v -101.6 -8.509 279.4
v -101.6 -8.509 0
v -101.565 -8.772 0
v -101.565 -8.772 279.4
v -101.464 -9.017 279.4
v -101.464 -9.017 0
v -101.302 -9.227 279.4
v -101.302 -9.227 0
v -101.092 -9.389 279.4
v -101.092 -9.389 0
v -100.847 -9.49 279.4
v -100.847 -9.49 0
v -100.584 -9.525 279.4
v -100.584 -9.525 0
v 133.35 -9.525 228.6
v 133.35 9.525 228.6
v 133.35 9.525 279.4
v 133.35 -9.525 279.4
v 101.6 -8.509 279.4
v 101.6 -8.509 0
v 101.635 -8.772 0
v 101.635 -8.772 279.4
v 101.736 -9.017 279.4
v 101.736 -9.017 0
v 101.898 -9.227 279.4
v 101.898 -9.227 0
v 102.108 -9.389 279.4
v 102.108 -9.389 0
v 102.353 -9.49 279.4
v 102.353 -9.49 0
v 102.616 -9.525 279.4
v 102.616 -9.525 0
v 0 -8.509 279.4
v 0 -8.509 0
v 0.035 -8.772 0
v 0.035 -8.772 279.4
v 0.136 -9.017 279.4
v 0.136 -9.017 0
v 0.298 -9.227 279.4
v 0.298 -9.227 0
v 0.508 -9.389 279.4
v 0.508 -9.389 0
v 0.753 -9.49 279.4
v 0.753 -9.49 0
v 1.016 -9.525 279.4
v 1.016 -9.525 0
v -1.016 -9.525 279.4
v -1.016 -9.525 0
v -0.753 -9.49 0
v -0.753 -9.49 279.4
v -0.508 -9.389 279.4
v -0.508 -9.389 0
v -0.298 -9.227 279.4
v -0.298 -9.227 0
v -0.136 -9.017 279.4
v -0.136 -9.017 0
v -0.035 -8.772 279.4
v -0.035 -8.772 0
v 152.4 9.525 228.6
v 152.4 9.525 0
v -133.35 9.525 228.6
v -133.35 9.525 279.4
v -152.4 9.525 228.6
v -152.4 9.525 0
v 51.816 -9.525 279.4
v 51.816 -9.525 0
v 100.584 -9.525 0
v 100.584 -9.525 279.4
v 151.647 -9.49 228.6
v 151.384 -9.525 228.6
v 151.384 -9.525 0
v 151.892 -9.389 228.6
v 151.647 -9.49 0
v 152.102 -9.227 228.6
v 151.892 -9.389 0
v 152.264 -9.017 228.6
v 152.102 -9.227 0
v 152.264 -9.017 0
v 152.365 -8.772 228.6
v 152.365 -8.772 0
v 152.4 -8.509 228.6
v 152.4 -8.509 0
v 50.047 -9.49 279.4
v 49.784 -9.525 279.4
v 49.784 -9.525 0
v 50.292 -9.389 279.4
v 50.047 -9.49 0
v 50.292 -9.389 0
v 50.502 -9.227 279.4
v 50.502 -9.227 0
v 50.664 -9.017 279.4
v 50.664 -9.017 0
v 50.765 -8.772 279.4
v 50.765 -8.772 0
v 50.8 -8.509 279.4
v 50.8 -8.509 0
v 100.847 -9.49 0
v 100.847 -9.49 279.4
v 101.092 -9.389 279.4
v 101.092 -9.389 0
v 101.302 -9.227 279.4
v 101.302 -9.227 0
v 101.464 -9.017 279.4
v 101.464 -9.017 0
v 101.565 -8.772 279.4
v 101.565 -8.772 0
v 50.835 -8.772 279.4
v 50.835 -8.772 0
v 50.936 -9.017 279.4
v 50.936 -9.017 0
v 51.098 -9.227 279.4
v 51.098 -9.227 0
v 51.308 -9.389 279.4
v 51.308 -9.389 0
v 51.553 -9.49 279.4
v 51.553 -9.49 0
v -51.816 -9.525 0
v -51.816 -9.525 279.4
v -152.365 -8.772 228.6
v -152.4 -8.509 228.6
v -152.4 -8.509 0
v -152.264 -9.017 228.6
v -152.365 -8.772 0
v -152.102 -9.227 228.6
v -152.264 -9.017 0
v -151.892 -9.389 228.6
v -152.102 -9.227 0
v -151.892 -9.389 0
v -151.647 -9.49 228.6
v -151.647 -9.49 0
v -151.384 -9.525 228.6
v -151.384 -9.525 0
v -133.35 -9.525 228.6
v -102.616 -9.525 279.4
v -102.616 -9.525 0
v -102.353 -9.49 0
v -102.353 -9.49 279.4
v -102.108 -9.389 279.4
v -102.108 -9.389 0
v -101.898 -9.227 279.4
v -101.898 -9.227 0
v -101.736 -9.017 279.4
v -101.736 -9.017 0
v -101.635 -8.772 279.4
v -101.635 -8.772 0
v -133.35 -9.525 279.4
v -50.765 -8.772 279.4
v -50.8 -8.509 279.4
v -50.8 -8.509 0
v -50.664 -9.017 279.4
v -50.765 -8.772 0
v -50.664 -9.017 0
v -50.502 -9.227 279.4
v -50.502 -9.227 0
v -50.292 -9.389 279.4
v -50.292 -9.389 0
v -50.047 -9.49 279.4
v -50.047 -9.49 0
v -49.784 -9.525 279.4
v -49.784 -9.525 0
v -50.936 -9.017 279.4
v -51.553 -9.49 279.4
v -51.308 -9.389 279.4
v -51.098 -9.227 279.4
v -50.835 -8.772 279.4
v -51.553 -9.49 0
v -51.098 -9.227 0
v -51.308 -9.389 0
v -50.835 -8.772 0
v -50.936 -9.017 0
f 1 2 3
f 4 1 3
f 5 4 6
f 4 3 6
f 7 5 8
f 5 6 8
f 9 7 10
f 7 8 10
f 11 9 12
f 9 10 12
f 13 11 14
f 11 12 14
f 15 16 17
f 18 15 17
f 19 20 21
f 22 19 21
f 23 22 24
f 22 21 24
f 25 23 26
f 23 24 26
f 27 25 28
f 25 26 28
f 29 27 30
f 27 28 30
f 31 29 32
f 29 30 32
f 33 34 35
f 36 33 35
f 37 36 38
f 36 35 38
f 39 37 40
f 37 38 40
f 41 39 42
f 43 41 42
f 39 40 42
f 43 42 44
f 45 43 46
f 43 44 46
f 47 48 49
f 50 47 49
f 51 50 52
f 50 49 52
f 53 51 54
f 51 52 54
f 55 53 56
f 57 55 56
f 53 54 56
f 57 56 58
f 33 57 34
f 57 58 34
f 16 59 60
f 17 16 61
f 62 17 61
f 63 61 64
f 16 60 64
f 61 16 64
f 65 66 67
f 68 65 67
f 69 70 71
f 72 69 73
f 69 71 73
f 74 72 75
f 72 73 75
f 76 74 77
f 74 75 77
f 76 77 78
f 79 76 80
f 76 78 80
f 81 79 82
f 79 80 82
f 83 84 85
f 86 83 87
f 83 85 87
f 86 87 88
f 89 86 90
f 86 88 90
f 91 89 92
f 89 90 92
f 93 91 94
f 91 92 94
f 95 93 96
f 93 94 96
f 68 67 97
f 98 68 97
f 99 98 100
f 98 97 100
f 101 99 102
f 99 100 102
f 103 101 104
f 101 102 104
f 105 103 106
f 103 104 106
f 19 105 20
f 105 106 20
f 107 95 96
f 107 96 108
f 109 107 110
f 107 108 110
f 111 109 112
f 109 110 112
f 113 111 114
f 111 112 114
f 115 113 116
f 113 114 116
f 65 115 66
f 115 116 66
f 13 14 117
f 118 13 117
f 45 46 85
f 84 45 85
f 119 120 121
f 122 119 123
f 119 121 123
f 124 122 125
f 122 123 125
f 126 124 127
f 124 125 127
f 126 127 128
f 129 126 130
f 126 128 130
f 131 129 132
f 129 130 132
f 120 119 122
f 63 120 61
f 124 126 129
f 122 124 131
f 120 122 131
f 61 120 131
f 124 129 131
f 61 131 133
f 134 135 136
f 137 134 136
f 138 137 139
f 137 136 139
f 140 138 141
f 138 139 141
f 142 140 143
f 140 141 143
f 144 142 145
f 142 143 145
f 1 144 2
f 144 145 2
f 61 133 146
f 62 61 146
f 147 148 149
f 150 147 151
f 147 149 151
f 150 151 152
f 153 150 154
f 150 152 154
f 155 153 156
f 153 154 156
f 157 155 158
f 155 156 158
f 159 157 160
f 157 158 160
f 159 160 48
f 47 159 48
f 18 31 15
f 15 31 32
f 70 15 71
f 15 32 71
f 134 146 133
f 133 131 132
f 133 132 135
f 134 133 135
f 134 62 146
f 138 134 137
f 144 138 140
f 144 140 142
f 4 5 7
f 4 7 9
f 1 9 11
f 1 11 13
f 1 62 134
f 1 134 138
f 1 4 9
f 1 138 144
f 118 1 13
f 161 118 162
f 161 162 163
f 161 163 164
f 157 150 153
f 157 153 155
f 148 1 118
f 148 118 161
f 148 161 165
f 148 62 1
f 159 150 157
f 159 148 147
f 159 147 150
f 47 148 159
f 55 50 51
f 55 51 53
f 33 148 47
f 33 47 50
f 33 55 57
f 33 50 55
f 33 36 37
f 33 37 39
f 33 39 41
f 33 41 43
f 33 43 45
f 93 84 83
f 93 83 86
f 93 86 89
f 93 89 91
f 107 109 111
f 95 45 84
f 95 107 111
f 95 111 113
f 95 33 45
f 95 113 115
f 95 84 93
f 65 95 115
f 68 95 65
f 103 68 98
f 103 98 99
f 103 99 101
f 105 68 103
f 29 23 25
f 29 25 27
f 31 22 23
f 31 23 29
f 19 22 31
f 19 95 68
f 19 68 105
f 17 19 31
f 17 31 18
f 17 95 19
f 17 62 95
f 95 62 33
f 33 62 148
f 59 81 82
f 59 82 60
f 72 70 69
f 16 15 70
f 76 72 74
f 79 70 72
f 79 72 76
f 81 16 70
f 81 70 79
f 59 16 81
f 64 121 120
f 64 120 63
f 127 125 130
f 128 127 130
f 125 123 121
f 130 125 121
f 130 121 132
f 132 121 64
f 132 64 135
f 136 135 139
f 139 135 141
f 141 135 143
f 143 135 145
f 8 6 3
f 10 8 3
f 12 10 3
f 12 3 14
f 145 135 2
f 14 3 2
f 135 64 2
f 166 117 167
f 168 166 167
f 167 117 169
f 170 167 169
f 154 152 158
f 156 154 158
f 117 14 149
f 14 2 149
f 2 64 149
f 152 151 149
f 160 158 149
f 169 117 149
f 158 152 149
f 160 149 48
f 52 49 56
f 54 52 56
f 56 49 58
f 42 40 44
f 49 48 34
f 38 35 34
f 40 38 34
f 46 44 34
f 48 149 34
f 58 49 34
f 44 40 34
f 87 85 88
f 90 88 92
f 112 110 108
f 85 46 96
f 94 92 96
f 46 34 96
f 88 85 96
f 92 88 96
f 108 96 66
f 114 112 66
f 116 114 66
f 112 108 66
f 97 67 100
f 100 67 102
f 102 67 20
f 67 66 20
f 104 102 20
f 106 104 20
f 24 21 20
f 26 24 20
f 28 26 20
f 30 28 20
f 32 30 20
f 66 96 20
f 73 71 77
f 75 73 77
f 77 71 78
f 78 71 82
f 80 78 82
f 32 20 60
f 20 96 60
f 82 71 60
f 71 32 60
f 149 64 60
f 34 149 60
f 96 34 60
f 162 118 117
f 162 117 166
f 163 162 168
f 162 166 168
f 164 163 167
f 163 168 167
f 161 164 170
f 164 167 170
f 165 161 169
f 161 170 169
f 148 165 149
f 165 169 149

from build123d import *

# Parameters (mm, degrees)
F1_DEPTH = 279.4
F2_W     = 508
F2_H     = 426.719844
F2_H_2   = 111.069546
F3_DEPTH = 304.8
F4_W     = 19.05
F4_H     = 50.8
F5_DEPTH = 12.7


with BuildPart() as f1:
    # F0 (on Top) → F1 (new body)
    with BuildSketch(Plane.XY):
        with BuildLine():
            Line((458.216, -9.525), (533.4, -9.525))
            Line((533.4, -9.525), (533.4, 9.525))
            Line((533.4, 9.525), (-533.4, 9.525))
            Line((-533.4, 9.525), (-533.4, -9.525))
            Line((-533.4, -9.525), (-509.016, -9.525))
            ThreePointArc((-509.016, -9.525), (-508.29758, -9.22742), (-508, -8.509))
            ThreePointArc((-508, -8.509), (-507.70242, -9.22742), (-506.984, -9.525))
            Line((-506.984, -9.525), (-458.216, -9.525))
            ThreePointArc((-458.216, -9.525), (-457.49758, -9.22742), (-457.2, -8.509))
            ThreePointArc((-457.2, -8.509), (-456.90242, -9.22742), (-456.184, -9.525))
            Line((-456.184, -9.525), (-407.416, -9.525))
            ThreePointArc((-407.416, -9.525), (-406.69758, -9.22742), (-406.4, -8.509))
            ThreePointArc((-406.4, -8.509), (-406.10242, -9.22742), (-405.384, -9.525))
            Line((-405.384, -9.525), (-356.616, -9.525))
            ThreePointArc((-356.616, -9.525), (-355.89758, -9.22742), (-355.6, -8.509))
            ThreePointArc((-355.6, -8.509), (-355.30242, -9.22742), (-354.584, -9.525))
            Line((-354.584, -9.525), (-305.816, -9.525))
            ThreePointArc((-305.816, -9.525), (-305.09758, -9.22742), (-304.8, -8.509))
            ThreePointArc((-304.8, -8.509), (-304.50242, -9.22742), (-303.784, -9.525))
            Line((-303.784, -9.525), (-255.016, -9.525))
            ThreePointArc((-255.016, -9.525), (-254.29758, -9.22742), (-254, -8.509))
            ThreePointArc((-254, -8.509), (-253.70242, -9.22742), (-252.984, -9.525))
            Line((-252.984, -9.525), (-204.216, -9.525))
            ThreePointArc((-204.216, -9.525), (-203.49758, -9.22742), (-203.2, -8.509))
            ThreePointArc((-203.2, -8.509), (-202.90242, -9.22742), (-202.184, -9.525))
            Line((-202.184, -9.525), (-153.416, -9.525))
            ThreePointArc((-153.416, -9.525), (-152.69758, -9.22742), (-152.4, -8.509))
            ThreePointArc((-152.4, -8.509), (-152.10242, -9.22742), (-151.384, -9.525))
            Line((-151.384, -9.525), (-102.616, -9.525))
            ThreePointArc((-102.616, -9.525), (-101.89758, -9.22742), (-101.6, -8.509))
            ThreePointArc((-101.6, -8.509), (-101.30242, -9.22742), (-100.584, -9.525))
            Line((-100.584, -9.525), (-51.816, -9.525))
            ThreePointArc((-51.816, -9.525), (-51.09758, -9.22742), (-50.8, -8.509))
            ThreePointArc((-50.8, -8.509), (-50.50242, -9.22742), (-49.784, -9.525))
            Line((-49.784, -9.525), (-1.016, -9.525))
            ThreePointArc((-1.016, -9.525), (-0.29758, -9.22742), (0, -8.509))
            ThreePointArc((0, -8.509), (0.29758, -9.22742), (1.016, -9.525))
            Line((1.016, -9.525), (49.784, -9.525))
            ThreePointArc((49.784, -9.525), (50.50242, -9.22742), (50.8, -8.509))
            ThreePointArc((50.8, -8.509), (51.09758, -9.22742), (51.816, -9.525))
            Line((51.816, -9.525), (100.584, -9.525))
            ThreePointArc((100.584, -9.525), (101.30242, -9.22742), (101.6, -8.509))
            ThreePointArc((101.6, -8.509), (101.89758, -9.22742), (102.616, -9.525))
            Line((102.616, -9.525), (151.384, -9.525))
            ThreePointArc((151.384, -9.525), (152.10242, -9.22742), (152.4, -8.509))
            ThreePointArc((152.4, -8.509), (152.69758, -9.22742), (153.416, -9.525))
            Line((153.416, -9.525), (202.184, -9.525))
            ThreePointArc((202.184, -9.525), (202.90242, -9.22742), (203.2, -8.509))
            ThreePointArc((203.2, -8.509), (203.49758, -9.22742), (204.216, -9.525))
            Line((204.216, -9.525), (252.984, -9.525))
            ThreePointArc((252.984, -9.525), (253.70242, -9.22742), (254, -8.509))
            ThreePointArc((254, -8.509), (254.29758, -9.22742), (255.016, -9.525))
            Line((255.016, -9.525), (303.784, -9.525))
            ThreePointArc((303.784, -9.525), (304.50242, -9.22742), (304.8, -8.509))
            ThreePointArc((304.8, -8.509), (305.09758, -9.22742), (305.816, -9.525))
            Line((305.816, -9.525), (354.584, -9.525))
            ThreePointArc((354.584, -9.525), (355.30242, -9.22742), (355.6, -8.509))
            ThreePointArc((355.6, -8.509), (355.89758, -9.22742), (356.616, -9.525))
            Line((356.616, -9.525), (405.384, -9.525))
            ThreePointArc((405.384, -9.525), (406.10242, -9.22742), (406.4, -8.509))
            ThreePointArc((406.4, -8.509), (406.69758, -9.22742), (407.416, -9.525))
            Line((407.416, -9.525), (456.184, -9.525))
            ThreePointArc((456.184, -9.525), (456.90242, -9.22742), (457.2, -8.509))
            ThreePointArc((457.2, -8.509), (457.49758, -9.22742), (458.216, -9.525))
        make_face()
        with BuildLine():
            ThreePointArc((-508, -8.509), (-508.29758, -9.22742), (-509.016, -9.525))
            Line((-509.016, -9.525), (-506.984, -9.525))
            ThreePointArc((-506.984, -9.525), (-507.70242, -9.22742), (-508, -8.509))
        make_face()
    extrude(amount=F1_DEPTH)

    # F2 (on Top) → F3 (cut, symmetric)
    with BuildSketch(Plane.XY):
        with Locations((-406.4, 0)):
            Rectangle(F2_W, F2_H)
        with Locations((406.4, 0)):
            Rectangle(F2_W, F2_H_2)
    extrude(amount=F3_DEPTH, both=True, mode=Mode.SUBTRACT)

    # F4 (on Front) → F5 (cut, symmetric)
    with BuildSketch(Plane.XZ):
        with Locations((142.875, 254)):
            Rectangle(F4_W, F4_H)
        with Locations((-142.875, 254)):
            Rectangle(F4_W, F4_H)
    extrude(amount=F5_DEPTH, both=True, mode=Mode.SUBTRACT)


solid = f1.part
